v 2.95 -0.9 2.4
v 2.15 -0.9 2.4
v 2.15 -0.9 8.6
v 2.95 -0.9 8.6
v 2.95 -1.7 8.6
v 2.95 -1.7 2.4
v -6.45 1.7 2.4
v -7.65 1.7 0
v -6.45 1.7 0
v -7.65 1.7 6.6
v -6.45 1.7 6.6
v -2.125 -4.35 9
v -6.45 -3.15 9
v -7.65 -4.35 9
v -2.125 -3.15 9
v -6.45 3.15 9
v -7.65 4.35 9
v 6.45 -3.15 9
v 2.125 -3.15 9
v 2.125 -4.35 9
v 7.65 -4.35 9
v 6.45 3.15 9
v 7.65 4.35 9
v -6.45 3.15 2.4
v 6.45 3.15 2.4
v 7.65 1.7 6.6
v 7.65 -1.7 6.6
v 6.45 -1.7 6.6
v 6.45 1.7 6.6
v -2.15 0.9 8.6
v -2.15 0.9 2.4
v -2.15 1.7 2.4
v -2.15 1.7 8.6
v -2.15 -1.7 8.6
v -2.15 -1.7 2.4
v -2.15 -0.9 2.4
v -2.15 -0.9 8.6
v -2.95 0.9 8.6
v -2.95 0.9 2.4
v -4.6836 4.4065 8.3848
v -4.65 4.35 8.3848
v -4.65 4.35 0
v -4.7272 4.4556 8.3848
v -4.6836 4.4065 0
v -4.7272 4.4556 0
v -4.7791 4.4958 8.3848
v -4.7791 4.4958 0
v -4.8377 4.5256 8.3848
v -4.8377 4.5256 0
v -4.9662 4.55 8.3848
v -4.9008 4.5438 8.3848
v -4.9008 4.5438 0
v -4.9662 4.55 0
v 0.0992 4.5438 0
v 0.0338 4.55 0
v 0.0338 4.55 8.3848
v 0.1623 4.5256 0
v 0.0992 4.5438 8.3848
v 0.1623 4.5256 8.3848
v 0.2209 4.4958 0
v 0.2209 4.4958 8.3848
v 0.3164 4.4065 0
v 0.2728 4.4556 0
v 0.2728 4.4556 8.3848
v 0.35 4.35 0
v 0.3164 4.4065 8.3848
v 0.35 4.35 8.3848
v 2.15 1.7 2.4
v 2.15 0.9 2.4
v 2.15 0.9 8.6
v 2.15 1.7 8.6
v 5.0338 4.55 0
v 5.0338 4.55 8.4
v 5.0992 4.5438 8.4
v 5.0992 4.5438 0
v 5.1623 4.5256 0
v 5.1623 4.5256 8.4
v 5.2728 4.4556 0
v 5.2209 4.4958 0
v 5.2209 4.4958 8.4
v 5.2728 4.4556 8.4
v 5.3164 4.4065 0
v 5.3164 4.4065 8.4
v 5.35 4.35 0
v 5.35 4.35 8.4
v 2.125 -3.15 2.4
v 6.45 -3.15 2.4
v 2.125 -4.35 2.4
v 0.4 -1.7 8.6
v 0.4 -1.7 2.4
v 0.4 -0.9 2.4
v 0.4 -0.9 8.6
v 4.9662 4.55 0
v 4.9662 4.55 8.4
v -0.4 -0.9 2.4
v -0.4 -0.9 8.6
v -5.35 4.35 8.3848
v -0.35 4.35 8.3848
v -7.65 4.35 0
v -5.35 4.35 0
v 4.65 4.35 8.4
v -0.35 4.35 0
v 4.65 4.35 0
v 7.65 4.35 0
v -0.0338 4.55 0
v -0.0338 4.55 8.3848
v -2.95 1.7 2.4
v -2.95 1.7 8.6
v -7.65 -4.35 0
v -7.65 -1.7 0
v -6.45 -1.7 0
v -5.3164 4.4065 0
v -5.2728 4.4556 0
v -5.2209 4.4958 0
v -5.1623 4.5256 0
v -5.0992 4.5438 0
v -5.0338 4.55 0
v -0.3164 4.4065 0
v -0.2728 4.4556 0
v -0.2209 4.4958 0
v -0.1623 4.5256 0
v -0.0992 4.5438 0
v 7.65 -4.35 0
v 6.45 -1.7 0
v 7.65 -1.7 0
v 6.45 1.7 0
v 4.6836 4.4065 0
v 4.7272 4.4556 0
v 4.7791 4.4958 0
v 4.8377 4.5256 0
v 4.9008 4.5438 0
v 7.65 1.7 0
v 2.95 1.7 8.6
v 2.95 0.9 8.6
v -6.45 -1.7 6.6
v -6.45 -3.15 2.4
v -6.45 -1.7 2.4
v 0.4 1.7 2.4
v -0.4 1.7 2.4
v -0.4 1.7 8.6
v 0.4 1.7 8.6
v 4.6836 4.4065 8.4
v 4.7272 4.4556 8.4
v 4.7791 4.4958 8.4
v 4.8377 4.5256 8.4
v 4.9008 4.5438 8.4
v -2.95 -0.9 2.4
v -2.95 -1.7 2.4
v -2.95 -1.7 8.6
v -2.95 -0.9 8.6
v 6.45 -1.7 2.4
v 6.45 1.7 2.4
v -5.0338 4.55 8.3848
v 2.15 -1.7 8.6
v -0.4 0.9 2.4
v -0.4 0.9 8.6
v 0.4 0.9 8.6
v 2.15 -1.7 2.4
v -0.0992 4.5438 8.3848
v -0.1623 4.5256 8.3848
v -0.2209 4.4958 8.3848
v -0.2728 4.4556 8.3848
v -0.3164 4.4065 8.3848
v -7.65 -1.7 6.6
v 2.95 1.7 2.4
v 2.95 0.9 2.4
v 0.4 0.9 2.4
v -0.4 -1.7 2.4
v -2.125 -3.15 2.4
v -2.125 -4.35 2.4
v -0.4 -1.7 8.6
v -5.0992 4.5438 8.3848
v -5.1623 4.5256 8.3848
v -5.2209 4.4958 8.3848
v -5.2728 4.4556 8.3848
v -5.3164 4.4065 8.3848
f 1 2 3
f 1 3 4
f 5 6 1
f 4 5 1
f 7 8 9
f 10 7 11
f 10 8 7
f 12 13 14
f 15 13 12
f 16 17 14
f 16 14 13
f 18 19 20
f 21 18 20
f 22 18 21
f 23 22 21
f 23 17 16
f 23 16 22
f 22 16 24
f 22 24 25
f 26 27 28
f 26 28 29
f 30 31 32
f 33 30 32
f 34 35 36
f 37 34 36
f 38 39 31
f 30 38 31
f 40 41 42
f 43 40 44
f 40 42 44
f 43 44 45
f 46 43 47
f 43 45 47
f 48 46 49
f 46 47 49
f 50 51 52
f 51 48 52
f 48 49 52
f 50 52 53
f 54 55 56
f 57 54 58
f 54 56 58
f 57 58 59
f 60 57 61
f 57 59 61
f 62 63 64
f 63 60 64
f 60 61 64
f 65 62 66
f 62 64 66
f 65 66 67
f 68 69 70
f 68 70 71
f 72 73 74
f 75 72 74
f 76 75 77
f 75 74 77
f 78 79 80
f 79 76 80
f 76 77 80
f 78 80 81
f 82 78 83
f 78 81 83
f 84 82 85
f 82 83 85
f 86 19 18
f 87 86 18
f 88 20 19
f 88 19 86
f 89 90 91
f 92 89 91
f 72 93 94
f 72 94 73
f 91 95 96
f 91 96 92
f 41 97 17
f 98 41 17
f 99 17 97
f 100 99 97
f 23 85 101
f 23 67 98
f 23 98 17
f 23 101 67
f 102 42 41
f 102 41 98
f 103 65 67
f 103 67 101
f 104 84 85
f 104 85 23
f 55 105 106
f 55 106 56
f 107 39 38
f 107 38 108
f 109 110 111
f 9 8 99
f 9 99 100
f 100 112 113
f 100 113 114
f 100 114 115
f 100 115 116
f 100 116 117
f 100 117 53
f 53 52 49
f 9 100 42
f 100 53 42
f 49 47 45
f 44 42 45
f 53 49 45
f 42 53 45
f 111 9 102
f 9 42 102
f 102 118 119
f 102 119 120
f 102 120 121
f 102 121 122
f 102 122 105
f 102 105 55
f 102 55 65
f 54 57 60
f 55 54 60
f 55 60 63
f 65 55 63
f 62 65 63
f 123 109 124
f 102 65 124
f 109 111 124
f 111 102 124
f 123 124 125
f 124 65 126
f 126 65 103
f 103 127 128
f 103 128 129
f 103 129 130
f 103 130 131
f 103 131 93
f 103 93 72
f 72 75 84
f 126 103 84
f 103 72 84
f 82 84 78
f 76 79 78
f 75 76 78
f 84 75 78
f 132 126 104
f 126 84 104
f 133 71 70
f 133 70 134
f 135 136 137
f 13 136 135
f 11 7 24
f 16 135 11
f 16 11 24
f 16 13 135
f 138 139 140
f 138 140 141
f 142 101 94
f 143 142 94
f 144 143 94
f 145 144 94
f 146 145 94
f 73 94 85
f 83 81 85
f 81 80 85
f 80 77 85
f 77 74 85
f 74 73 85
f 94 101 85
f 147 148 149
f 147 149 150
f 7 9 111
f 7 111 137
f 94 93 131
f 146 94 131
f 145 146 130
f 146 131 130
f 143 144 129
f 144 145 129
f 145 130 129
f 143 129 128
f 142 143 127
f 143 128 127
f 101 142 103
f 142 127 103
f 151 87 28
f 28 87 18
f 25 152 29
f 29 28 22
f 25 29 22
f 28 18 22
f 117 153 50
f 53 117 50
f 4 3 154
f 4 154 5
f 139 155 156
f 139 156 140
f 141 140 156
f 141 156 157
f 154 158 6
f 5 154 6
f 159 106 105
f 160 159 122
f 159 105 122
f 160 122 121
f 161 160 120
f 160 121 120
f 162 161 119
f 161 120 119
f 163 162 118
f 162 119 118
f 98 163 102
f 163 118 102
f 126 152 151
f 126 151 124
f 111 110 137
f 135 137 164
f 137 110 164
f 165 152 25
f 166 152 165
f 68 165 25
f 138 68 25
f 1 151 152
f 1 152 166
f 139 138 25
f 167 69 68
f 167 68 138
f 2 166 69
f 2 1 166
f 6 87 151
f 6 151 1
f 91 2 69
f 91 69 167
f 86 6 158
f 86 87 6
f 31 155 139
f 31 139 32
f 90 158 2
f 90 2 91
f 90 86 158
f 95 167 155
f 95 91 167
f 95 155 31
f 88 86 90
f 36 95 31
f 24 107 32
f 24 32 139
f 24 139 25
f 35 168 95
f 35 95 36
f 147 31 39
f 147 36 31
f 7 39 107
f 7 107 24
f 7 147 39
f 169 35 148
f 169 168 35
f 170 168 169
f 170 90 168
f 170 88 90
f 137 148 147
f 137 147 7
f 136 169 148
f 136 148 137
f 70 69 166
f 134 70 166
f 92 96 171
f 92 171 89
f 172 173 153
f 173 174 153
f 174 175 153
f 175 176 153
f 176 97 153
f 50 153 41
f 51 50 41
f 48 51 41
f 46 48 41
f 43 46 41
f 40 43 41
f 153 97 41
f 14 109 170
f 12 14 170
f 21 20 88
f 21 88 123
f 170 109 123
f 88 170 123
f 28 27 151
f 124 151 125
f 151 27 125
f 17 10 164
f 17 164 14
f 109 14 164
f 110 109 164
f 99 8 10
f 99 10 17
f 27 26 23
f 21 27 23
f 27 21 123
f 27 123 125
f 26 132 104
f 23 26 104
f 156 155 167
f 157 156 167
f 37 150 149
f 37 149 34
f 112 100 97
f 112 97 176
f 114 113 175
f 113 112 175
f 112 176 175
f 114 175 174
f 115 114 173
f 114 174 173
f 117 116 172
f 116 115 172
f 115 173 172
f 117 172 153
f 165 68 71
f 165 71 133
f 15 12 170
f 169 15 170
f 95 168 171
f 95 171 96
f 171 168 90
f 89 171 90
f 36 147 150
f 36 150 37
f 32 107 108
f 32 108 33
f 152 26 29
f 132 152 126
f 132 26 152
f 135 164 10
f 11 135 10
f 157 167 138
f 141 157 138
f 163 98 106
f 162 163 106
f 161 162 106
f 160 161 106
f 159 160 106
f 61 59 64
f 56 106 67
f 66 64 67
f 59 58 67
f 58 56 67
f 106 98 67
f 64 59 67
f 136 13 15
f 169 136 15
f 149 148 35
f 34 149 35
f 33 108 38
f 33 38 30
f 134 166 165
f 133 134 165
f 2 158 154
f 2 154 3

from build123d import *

# Parameters (mm, degrees)
SKICA1_W                 = 15.3
SKICA1_H                 = 8.7
P_IDAT_VYSUNUT_M1_DEPTH  = 9
SKICA2_W                 = 12.9
SKICA2_H                 = 6.3
ODEBRAT_VYSUNUT_M1_DEPTH = 6.6
SKICA3_W                 = 4.25
SKICA3_H                 = 6.6
ODEBRAT_VYSUNUT_M2_DEPTH = 6.6
SKICA4_W                 = 6.6
SKICA4_H                 = 3.4
ODEBRAT_VYSUNUT_M3_DEPTH = 1.2
SKICA5_W                 = 6.6
SKICA5_H                 = 3.4
ODEBRAT_VYSUNUT_M4_DEPTH = 1.2
SKICA6_W                 = 0.7
SKICA6_H                 = 8.4
SKICA6_H_2               = 8.384805524
P_IDAT_VYSUNUT_M2_DEPTH  = 0.2
ZAOBLIT2_R               = 0.35
ZAOBLIT3_R               = 0.35
SKICA7_W                 = 0.8
SKICA7_H                 = 0.8
P_IDAT_VYSUNUT_M3_DEPTH  = 6.2


with BuildPart() as part:
    # Skica1 → Přidat vysunutím1 (new body)
    with BuildSketch(Plane.XY):
        Rectangle(SKICA1_W, SKICA1_H)
    extrude(amount=P_IDAT_VYSUNUT_M1_DEPTH)

    # Skica2 → Odebrat vysunutím1 (cut)
    with BuildSketch(Plane.XY.offset(9)):
        Rectangle(SKICA2_W, SKICA2_H)
    extrude(amount=-ODEBRAT_VYSUNUT_M1_DEPTH, mode=Mode.SUBTRACT)

    # Skica3 → Odebrat vysunutím2 (cut)
    with BuildSketch(Plane(origin=(0, -4.35, 0), x_dir=(-1, 0, 0), z_dir=(0, -1, 0))):
        with Locations((0, -5.7)):
            Rectangle(SKICA3_W, SKICA3_H)
    extrude(amount=-ODEBRAT_VYSUNUT_M2_DEPTH, mode=Mode.SUBTRACT)

    # Skica4 → Odebrat vysunutím3 (cut)
    with BuildSketch(Plane.ZY.offset(7.65)):
        with Locations((3.3, 0)):
            Rectangle(SKICA4_W, SKICA4_H)
    extrude(amount=-ODEBRAT_VYSUNUT_M3_DEPTH, mode=Mode.SUBTRACT)

    # Skica5 → Odebrat vysunutím4 (cut)
    with BuildSketch(Plane(origin=(7.65, 0, 0), x_dir=(0, 0, -1), z_dir=(1, 0, 0))):
        with Locations((-3.3, 0)):
            Rectangle(SKICA5_W, SKICA5_H)
    extrude(amount=-ODEBRAT_VYSUNUT_M4_DEPTH, mode=Mode.SUBTRACT)

    # Skica6 → Přidat vysunutím2 (add)
    with BuildSketch(Plane(origin=(0, 4.35, 0), x_dir=(1, 0, 0), z_dir=(0, 1, 0))):
        with Locations((5, -4.2)):
            Rectangle(SKICA6_W, SKICA6_H)
        with Locations((0, -4.192402762)):
            Rectangle(SKICA6_W, SKICA6_H_2)
        with Locations((-5, -4.192402762)):
            Rectangle(SKICA6_W, SKICA6_H_2)
    extrude(amount=P_IDAT_VYSUNUT_M2_DEPTH)

    # Zaoblit2
    # the kernel refuses this fillet: 0.35 mm, written as the material it takes off along each edge
    with BuildSketch(Plane(origin=(5.35, 4.55, 9.190569415), x_dir=(0, -1, 0), z_dir=(0, 0, -1))) as zaoblit2_piece_1:
        with BuildLine():
            CenterArc((0.35, 0.316227766), ZAOBLIT2_R, 180, 64.623066475)
            Line((0, 0.316227766), (-0.007, 0.316227766))
            Line((-0.007, 0.316227766), (-0.007, 0))
            Line((-0.007, 0), (0, -0.007))
            ThreePointArc((0, -0.007), (0.1, -0.007), (0.197, -0.006324555))
            Line((0.197, -0.006324555), (0.2, 0))
        make_face()
    extrude(amount=9.98113883, mode=Mode.SUBTRACT)

    # Zaoblit3
    # the kernel refuses this fillet: 0.35 mm, written as the material it takes off along each edge
    with BuildSketch(Plane(origin=(-5.35, 4.55, 9.175374939), x_dir=(1, 0, 0), z_dir=(0, 0, -1))) as zaoblit3_piece_1:
        with BuildLine():
            CenterArc((0.316227766, 0.35), ZAOBLIT3_R, 205.376933525, 64.623066475)
            Line((0, 0.2), (-0.006324555, 0.197))
            ThreePointArc((-0.006324555, 0.197), (-0.007, 0.1), (-0.007, 0))
            Line((-0.007, 0), (0, -0.007))
            Line((0, -0.007), (0.316227766, -0.007))
            Line((0.316227766, -0.007), (0.316227766, 0))
        make_face()
    extrude(amount=9.965944354, mode=Mode.SUBTRACT)
    with BuildSketch(Plane(origin=(-4.65, 4.55, -0.790569415), x_dir=(0, -1, 0), z_dir=(0, 0, 1))) as zaoblit3_piece_2:
        with BuildLine():
            CenterArc((0.35, -0.316227766), ZAOBLIT3_R, 115.376933525, 64.623066475)
            Line((0, -0.316227766), (-0.007, -0.316227766))
            Line((-0.007, -0.316227766), (-0.007, 0))
            Line((-0.007, 0), (0, 0.007))
            ThreePointArc((0, 0.007), (0.1, 0.007), (0.197, 0.006324555))
            Line((0.197, 0.006324555), (0.2, 0))
        make_face()
    extrude(amount=9.965944354, mode=Mode.SUBTRACT)
    with BuildSketch(Plane(origin=(-0.35, 4.55, -0.790569415), x_dir=(1, 0, 0), z_dir=(0, 0, 1))) as zaoblit3_piece_3:
        with BuildLine():
            CenterArc((0.316227766, -0.35), ZAOBLIT3_R, 90, 64.623066475)
            Line((0, -0.2), (-0.006324555, -0.197))
            ThreePointArc((-0.006324555, -0.197), (-0.007, -0.1), (-0.007, 0))
            Line((-0.007, 0), (0, 0.007))
            Line((0, 0.007), (0.316227766, 0.007))
            Line((0.316227766, 0.007), (0.316227766, 0))
        make_face()
    extrude(amount=9.965944354, mode=Mode.SUBTRACT)
    with BuildSketch(Plane(origin=(0.35, 4.55, 9.175374939), x_dir=(0, -1, 0), z_dir=(0, 0, -1))) as zaoblit3_piece_4:
        with BuildLine():
            CenterArc((0.35, 0.316227766), ZAOBLIT3_R, 180, 64.623066475)
            Line((0, 0.316227766), (-0.007, 0.316227766))
            Line((-0.007, 0.316227766), (-0.007, 0))
            Line((-0.007, 0), (0, -0.007))
            ThreePointArc((0, -0.007), (0.1, -0.007), (0.197, -0.006324555))
            Line((0.197, -0.006324555), (0.2, 0))
        make_face()
    extrude(amount=9.965944354, mode=Mode.SUBTRACT)
    with BuildSketch(Plane(origin=(4.65, 4.55, -0.790569415), x_dir=(0, -1, 0), z_dir=(0, 0, 1))) as zaoblit3_piece_5:
        with BuildLine():
            CenterArc((0.35, 0.316227766), ZAOBLIT3_R, 180, 64.623066475)
            Line((0, 0.316227766), (-0.007, 0.316227766))
            Line((-0.007, 0.316227766), (-0.007, 0))
            Line((-0.007, 0), (0, -0.007))
            ThreePointArc((0, -0.007), (0.1, -0.007), (0.197, -0.006324555))
            Line((0.197, -0.006324555), (0.2, 0))
        make_face()
    extrude(amount=9.98113883, mode=Mode.SUBTRACT)

    # Skica7 → Přidat vysunutím3 (add)
    with BuildSketch(Plane.XY.offset(2.4)):
        with Locations((-2.55, -1.3)):
            Rectangle(SKICA7_W, SKICA7_H)
        with Locations((-2.55, 1.3)):
            Rectangle(SKICA7_W, SKICA7_H)
        with Locations((0, -1.3)):
            Rectangle(SKICA7_W, SKICA7_H)
        with Locations((2.55, -1.3)):
            Rectangle(SKICA7_W, SKICA7_H)
        with Locations((2.55, 1.3)):
            Rectangle(SKICA7_W, SKICA7_H)
        with Locations((0, 1.3)):
            Rectangle(SKICA7_W, SKICA7_H)
    extrude(amount=P_IDAT_VYSUNUT_M3_DEPTH)


solid = part.part
